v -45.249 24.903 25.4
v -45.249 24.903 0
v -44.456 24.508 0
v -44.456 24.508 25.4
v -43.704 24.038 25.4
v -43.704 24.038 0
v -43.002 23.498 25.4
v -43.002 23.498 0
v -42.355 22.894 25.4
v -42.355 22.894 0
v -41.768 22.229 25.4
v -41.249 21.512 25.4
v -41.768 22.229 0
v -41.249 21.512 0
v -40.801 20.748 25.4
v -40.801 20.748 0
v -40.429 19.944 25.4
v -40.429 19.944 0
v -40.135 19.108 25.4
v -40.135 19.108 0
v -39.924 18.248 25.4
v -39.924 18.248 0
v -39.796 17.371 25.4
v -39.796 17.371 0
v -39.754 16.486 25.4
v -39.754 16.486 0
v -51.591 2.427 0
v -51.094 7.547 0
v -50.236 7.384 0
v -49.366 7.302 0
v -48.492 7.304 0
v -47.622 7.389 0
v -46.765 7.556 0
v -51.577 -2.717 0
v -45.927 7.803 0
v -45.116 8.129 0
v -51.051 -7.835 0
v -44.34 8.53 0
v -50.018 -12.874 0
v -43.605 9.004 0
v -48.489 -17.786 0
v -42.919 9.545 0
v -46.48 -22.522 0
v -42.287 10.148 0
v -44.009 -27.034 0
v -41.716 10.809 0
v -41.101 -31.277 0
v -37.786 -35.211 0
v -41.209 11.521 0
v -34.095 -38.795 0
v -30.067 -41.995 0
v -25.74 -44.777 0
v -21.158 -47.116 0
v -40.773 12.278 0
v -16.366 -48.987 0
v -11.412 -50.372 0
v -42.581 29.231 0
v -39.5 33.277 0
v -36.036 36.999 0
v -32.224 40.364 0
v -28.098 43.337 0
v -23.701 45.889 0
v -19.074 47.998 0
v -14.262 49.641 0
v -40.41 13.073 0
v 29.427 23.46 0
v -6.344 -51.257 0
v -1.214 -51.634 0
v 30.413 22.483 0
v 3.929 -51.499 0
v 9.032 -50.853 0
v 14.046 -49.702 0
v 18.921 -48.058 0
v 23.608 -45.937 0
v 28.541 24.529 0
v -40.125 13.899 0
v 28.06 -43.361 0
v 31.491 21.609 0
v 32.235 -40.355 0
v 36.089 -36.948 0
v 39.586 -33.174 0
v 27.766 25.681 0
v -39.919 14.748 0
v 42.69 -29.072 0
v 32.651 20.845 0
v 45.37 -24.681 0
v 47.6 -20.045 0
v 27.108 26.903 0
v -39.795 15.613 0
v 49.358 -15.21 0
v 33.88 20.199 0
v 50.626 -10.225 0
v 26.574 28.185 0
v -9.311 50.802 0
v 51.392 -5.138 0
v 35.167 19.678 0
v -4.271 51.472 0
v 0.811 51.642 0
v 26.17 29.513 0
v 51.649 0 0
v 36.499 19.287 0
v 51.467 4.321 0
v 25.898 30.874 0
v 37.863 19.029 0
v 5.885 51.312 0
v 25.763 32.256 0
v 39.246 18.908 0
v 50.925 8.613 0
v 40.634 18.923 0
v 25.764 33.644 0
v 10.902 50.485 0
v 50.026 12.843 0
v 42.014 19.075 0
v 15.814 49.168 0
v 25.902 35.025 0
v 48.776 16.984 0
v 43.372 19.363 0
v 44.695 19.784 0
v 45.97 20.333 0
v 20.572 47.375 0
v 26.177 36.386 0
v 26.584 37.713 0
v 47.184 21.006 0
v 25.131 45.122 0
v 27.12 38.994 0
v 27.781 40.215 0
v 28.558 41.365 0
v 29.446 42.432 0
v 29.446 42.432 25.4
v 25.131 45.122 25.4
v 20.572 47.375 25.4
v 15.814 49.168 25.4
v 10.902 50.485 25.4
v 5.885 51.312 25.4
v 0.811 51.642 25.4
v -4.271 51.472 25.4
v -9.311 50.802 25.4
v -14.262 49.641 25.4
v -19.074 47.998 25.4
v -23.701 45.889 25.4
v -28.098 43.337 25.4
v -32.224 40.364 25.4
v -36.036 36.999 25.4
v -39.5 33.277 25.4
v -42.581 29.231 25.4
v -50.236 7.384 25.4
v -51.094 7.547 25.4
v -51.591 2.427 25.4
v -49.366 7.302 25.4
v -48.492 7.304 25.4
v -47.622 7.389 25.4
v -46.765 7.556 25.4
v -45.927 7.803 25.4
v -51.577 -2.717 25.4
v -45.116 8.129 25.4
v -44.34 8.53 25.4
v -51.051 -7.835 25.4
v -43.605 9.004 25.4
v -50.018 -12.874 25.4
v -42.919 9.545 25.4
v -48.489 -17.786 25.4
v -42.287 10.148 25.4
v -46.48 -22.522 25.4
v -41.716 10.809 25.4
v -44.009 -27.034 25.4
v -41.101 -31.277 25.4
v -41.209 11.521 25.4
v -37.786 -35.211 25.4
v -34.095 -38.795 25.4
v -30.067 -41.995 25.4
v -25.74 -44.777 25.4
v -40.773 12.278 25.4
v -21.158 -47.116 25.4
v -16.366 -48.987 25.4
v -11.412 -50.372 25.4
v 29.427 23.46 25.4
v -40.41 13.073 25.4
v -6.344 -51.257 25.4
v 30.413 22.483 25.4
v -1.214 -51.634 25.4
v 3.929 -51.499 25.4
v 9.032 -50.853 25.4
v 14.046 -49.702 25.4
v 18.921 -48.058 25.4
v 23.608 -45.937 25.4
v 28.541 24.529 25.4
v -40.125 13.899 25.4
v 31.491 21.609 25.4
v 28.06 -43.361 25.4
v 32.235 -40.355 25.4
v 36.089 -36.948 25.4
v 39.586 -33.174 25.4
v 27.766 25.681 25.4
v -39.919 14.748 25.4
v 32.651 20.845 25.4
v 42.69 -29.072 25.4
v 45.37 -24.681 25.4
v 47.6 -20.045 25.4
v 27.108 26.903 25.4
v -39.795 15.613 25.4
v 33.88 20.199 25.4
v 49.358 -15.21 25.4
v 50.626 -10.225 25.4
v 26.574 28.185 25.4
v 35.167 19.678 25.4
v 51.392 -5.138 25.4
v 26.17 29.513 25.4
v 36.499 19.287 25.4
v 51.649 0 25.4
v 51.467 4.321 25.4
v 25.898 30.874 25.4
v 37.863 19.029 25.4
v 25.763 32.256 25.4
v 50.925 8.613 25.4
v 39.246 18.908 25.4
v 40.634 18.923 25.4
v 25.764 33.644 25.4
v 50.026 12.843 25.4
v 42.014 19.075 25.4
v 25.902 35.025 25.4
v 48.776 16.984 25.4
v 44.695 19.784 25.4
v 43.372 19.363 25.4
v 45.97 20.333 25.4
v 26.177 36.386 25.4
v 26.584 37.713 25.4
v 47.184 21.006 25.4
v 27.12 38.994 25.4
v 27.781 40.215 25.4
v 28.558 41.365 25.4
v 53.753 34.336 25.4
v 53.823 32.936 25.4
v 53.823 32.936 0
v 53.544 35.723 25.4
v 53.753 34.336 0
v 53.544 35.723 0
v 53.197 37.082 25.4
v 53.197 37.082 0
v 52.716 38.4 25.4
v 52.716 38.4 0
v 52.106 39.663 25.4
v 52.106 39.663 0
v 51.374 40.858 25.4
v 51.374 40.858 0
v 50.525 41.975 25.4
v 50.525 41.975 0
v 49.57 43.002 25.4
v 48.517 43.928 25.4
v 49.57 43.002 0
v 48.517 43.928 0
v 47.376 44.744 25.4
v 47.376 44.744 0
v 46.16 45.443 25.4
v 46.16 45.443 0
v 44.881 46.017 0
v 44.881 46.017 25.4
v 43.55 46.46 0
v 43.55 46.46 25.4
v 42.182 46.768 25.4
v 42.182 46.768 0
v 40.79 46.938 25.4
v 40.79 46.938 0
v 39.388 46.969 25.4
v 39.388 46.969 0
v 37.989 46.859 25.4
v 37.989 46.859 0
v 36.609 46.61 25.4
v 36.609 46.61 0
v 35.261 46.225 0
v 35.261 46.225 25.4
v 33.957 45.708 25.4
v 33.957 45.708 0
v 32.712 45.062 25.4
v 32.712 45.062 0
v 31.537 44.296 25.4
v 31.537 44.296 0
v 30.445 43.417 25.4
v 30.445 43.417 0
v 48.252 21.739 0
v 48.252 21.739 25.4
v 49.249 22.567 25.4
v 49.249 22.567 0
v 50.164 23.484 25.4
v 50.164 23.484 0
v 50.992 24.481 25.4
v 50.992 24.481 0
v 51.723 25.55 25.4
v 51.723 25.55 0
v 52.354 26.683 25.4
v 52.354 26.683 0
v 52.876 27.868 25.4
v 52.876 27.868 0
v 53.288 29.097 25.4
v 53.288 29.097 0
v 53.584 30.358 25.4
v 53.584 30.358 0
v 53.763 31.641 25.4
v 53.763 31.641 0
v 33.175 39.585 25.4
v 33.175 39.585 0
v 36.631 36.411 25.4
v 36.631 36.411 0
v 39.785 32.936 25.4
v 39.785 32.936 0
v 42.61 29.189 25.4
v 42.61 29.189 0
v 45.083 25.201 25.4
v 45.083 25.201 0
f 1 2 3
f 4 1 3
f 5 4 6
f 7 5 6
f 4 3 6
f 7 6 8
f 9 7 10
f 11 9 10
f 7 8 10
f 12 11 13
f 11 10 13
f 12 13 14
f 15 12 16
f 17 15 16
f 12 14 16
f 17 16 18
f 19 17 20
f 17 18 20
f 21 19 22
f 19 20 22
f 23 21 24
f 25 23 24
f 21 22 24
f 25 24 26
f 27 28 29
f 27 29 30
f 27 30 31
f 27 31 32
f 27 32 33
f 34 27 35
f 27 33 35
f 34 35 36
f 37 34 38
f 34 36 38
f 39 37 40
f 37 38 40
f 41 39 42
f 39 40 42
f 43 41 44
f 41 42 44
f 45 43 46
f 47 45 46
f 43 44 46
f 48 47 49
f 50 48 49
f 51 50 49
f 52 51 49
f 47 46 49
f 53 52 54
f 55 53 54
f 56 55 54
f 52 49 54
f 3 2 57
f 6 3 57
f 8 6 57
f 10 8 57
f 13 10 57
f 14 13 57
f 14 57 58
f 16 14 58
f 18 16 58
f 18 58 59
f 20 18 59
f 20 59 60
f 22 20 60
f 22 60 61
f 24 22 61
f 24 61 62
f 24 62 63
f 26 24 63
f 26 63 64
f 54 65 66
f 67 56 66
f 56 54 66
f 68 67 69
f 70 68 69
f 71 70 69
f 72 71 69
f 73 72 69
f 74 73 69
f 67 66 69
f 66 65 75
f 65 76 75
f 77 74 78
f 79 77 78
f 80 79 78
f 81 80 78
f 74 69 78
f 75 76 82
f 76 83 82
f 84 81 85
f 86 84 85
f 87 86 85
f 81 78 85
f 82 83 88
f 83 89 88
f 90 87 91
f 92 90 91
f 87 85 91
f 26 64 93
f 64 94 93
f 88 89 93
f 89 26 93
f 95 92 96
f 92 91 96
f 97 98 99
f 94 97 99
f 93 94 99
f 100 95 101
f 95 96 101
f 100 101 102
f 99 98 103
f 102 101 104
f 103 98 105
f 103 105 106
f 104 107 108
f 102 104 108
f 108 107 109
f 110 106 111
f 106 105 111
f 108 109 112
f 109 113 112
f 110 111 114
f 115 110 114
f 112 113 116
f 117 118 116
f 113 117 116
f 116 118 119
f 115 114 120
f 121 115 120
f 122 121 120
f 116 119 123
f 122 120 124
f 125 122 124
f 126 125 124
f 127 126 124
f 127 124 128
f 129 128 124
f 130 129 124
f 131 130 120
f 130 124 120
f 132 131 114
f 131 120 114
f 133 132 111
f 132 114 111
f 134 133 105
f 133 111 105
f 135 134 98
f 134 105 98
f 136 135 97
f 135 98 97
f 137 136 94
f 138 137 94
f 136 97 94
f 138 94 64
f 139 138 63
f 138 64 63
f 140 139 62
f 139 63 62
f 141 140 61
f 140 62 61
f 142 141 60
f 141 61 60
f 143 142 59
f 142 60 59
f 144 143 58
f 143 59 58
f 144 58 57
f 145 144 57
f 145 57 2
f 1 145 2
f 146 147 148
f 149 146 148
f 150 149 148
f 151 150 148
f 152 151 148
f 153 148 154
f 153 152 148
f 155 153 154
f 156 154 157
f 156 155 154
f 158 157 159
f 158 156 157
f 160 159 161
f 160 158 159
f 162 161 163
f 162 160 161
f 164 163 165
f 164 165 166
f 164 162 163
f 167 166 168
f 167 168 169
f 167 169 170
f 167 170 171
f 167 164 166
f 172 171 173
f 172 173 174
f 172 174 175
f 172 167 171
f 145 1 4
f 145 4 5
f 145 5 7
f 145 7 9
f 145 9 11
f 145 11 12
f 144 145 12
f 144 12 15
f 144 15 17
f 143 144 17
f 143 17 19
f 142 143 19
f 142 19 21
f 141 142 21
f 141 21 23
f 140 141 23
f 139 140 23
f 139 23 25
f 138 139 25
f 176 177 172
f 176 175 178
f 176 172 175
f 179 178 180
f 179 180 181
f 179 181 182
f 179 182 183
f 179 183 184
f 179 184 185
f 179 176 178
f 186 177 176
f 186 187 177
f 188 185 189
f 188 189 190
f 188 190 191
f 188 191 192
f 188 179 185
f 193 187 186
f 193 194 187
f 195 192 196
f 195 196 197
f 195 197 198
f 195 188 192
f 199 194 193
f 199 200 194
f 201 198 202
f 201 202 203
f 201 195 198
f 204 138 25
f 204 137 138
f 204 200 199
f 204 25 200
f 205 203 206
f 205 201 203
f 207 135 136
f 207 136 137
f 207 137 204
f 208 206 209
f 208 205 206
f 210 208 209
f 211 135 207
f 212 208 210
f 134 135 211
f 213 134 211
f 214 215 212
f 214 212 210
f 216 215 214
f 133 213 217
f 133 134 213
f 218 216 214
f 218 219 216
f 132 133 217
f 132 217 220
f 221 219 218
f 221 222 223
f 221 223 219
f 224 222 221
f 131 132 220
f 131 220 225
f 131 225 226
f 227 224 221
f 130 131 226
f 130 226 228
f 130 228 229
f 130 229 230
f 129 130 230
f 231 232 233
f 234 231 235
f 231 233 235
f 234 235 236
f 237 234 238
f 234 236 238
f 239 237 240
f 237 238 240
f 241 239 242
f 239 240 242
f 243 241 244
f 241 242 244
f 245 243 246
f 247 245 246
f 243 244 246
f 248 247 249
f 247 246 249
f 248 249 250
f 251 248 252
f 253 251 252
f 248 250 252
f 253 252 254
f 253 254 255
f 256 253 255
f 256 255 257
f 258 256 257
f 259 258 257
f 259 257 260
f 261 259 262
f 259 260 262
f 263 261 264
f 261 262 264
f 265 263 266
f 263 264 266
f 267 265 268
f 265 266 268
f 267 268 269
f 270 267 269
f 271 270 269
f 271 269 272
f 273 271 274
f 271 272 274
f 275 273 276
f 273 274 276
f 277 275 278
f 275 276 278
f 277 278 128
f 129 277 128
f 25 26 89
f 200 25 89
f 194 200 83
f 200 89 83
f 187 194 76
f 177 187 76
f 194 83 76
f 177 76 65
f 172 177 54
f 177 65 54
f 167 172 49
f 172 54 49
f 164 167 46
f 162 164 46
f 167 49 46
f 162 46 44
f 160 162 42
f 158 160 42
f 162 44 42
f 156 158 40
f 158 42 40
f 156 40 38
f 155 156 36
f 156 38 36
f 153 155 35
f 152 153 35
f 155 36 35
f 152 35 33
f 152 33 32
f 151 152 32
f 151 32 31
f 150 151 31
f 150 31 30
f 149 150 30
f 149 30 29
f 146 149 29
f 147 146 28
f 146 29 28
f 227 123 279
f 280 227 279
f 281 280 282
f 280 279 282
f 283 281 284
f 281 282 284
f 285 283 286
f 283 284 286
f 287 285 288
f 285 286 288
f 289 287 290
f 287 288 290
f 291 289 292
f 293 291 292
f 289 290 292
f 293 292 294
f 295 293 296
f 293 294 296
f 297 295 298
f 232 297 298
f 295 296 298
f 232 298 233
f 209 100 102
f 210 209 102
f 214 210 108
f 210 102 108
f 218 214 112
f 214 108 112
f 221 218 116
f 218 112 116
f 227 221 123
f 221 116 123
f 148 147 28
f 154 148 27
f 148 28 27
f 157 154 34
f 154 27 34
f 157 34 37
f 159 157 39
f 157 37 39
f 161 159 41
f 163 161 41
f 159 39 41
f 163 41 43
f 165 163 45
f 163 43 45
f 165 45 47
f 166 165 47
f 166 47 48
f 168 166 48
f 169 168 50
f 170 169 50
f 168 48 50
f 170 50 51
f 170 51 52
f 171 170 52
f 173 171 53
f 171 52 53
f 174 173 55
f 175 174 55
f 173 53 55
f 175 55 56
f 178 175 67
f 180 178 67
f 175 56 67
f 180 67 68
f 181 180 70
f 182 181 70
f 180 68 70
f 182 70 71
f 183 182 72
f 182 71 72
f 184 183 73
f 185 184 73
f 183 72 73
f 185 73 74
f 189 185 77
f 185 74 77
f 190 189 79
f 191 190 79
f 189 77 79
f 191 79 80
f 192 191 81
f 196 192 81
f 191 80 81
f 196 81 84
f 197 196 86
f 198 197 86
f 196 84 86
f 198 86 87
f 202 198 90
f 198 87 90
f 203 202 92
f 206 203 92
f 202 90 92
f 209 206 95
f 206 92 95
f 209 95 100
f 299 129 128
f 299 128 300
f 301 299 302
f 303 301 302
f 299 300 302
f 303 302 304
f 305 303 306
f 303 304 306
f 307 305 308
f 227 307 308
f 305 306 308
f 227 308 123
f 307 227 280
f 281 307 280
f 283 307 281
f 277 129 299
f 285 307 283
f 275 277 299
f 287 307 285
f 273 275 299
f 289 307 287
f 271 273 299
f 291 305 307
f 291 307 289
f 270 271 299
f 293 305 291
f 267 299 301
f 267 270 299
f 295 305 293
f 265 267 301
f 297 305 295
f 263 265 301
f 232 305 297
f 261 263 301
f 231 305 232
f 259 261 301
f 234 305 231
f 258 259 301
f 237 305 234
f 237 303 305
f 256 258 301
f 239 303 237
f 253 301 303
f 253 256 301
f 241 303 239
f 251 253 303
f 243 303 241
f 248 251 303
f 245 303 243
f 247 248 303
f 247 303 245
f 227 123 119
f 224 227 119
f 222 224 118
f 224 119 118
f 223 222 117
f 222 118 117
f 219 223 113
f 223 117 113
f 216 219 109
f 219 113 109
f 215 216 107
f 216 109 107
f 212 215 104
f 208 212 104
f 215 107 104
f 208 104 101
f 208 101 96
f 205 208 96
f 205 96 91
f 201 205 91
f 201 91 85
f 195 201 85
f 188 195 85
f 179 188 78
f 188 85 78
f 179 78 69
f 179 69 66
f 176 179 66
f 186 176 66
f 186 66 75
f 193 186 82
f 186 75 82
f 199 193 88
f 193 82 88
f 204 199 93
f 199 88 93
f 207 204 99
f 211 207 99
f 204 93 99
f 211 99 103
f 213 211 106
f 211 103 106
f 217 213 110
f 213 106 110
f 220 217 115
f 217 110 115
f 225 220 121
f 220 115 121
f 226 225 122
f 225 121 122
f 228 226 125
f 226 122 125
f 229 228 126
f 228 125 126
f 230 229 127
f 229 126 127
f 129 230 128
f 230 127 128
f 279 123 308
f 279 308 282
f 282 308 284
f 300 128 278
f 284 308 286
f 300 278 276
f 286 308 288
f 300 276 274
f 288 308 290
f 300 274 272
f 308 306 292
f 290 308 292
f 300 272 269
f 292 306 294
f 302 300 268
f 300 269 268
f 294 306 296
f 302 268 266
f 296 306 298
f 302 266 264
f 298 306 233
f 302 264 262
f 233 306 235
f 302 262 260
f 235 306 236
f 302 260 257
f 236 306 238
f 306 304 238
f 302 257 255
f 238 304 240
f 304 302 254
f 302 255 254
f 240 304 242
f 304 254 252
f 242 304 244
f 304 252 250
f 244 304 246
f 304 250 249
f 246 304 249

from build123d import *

# Parameters (mm, degrees)
F1_DEPTH = 25.4


with BuildPart() as f1:
    # F0 (on Top) → F1 (new body)
    with BuildSketch(Plane.XY):
        with BuildLine():
            ThreePointArc((-51.094143, 7.547205), (-3.78377, -51.509755), (51.648541, 0))
            ThreePointArc((51.648541, 0), (50.520095, 10.737401), (47.184067, 21.005608))
            ThreePointArc((47.184067, 21.005608), (28.970806, 23.9835), (29.445812, 42.432486))
            ThreePointArc((29.445812, 42.432486), (-11.800696, 50.282356), (-45.248582, 24.902562))
            ThreePointArc((-45.248582, 24.902562), (-41.248943, 21.511798), (-39.753571, 16.486039))
            ThreePointArc((-39.753571, 16.486039), (-43.255831, 9.266079), (-51.094143, 7.547205))
        make_face()
        with BuildLine():
            ThreePointArc((29.445812, 42.432486), (39.784574, 32.935685), (47.184067, 21.005608))
            ThreePointArc((47.184067, 21.005608), (52.051541, 26.109211), (53.823065, 32.935685))
            ThreePointArc((53.823065, 32.935685), (44.880583, 46.016585), (29.445812, 42.432486))
        make_face()
    extrude(amount=F1_DEPTH)


solid = f1.part
